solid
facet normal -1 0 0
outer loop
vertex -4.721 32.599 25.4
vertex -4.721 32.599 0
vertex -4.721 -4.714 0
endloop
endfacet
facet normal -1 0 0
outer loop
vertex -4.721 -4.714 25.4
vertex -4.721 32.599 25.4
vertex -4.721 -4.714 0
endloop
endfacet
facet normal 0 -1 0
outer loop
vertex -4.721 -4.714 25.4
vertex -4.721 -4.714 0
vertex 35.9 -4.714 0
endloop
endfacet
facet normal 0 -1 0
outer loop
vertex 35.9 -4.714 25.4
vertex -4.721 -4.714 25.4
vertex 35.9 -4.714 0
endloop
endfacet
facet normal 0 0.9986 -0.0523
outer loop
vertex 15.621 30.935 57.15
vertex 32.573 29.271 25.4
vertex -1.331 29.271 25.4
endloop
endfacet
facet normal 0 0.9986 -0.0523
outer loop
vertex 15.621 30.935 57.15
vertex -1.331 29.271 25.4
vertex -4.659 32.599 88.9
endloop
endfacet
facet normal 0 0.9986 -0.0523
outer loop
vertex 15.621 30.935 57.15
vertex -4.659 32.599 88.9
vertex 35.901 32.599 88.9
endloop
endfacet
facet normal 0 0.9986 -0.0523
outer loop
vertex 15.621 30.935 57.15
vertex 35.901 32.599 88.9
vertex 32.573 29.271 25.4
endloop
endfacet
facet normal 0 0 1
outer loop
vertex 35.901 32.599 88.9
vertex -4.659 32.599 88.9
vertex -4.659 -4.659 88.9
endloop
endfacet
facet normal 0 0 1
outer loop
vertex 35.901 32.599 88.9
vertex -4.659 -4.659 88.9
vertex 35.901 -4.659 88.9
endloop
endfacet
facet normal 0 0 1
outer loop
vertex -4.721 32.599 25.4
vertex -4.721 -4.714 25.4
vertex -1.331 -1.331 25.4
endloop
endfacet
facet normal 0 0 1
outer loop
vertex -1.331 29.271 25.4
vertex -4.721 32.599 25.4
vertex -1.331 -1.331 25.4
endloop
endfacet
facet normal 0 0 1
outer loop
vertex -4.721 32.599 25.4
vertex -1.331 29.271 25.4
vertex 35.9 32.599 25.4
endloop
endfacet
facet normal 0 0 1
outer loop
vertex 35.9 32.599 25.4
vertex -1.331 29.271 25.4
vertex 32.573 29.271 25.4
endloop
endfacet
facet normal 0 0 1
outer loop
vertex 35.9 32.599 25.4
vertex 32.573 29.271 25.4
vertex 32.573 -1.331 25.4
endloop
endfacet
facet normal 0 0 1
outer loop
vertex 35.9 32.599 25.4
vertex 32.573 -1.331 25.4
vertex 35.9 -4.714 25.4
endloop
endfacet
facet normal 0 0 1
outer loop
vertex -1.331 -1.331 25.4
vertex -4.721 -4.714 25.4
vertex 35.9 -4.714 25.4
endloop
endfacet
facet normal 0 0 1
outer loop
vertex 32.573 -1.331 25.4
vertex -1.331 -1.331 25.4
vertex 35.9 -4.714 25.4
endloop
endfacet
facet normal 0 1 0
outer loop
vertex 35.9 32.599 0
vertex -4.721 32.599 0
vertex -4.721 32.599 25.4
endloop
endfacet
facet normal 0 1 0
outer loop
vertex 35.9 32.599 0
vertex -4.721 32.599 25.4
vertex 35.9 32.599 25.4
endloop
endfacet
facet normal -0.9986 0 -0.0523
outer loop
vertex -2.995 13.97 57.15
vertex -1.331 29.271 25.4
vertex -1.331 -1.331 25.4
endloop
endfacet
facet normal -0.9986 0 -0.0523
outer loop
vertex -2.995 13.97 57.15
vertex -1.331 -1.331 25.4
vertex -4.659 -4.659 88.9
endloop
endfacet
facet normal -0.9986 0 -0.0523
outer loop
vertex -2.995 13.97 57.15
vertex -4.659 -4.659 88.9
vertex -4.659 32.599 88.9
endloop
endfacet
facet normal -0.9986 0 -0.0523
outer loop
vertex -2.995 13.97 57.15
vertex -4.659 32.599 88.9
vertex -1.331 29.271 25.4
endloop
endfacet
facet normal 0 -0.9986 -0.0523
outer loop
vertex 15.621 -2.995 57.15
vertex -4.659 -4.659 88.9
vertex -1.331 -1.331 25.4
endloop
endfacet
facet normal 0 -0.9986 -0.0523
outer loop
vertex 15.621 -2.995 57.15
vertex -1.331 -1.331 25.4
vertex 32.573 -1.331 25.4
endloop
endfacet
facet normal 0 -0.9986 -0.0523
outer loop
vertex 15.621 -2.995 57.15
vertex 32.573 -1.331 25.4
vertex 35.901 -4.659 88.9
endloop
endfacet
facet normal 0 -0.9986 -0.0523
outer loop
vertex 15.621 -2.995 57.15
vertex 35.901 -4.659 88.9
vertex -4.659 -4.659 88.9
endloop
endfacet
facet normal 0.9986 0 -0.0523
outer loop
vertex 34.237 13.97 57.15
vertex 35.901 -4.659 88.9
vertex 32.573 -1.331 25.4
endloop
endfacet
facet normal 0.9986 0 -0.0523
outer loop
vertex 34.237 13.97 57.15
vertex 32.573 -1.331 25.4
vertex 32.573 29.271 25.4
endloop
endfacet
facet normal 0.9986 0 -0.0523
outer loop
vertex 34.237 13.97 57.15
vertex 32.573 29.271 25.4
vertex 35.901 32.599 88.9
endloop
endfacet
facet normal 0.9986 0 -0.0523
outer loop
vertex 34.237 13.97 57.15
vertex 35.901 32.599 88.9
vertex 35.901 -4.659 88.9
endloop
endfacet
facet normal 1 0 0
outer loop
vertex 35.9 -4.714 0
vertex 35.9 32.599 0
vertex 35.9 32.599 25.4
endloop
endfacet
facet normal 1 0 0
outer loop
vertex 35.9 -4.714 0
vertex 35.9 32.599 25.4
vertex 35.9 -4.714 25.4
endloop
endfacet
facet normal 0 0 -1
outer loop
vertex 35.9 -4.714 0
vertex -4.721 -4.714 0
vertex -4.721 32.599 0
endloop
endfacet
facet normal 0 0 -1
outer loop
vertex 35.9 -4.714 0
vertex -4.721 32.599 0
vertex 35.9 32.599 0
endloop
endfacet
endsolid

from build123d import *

# Parameters (mm, degrees)
F0_W     = 31.242
F0_H     = 27.94
F1_DEPTH = 88.9
F1_TAPER = -3
F2_W     = 40.6205877662
F2_H     = 37.3129299842
F3_DEPTH = 25.4


with BuildPart() as f1:
    # F0 (on Top) → F1 (new body)
    with BuildSketch(Plane.XY):
        with Locations((15.621, 13.97)):
            Rectangle(F0_W, F0_H)
    extrude(amount=F1_DEPTH, taper=F1_TAPER)

    # F2 (on face) → F3 (join)
    with BuildSketch(Plane(origin=(0, 0, 0), x_dir=(1, 0, 0), z_dir=(0, 0, -1))):
        with Locations((15.5892632902, -13.9424998779)):
            Rectangle(F2_W, F2_H)
    extrude(amount=-F3_DEPTH)


solid = f1.part
